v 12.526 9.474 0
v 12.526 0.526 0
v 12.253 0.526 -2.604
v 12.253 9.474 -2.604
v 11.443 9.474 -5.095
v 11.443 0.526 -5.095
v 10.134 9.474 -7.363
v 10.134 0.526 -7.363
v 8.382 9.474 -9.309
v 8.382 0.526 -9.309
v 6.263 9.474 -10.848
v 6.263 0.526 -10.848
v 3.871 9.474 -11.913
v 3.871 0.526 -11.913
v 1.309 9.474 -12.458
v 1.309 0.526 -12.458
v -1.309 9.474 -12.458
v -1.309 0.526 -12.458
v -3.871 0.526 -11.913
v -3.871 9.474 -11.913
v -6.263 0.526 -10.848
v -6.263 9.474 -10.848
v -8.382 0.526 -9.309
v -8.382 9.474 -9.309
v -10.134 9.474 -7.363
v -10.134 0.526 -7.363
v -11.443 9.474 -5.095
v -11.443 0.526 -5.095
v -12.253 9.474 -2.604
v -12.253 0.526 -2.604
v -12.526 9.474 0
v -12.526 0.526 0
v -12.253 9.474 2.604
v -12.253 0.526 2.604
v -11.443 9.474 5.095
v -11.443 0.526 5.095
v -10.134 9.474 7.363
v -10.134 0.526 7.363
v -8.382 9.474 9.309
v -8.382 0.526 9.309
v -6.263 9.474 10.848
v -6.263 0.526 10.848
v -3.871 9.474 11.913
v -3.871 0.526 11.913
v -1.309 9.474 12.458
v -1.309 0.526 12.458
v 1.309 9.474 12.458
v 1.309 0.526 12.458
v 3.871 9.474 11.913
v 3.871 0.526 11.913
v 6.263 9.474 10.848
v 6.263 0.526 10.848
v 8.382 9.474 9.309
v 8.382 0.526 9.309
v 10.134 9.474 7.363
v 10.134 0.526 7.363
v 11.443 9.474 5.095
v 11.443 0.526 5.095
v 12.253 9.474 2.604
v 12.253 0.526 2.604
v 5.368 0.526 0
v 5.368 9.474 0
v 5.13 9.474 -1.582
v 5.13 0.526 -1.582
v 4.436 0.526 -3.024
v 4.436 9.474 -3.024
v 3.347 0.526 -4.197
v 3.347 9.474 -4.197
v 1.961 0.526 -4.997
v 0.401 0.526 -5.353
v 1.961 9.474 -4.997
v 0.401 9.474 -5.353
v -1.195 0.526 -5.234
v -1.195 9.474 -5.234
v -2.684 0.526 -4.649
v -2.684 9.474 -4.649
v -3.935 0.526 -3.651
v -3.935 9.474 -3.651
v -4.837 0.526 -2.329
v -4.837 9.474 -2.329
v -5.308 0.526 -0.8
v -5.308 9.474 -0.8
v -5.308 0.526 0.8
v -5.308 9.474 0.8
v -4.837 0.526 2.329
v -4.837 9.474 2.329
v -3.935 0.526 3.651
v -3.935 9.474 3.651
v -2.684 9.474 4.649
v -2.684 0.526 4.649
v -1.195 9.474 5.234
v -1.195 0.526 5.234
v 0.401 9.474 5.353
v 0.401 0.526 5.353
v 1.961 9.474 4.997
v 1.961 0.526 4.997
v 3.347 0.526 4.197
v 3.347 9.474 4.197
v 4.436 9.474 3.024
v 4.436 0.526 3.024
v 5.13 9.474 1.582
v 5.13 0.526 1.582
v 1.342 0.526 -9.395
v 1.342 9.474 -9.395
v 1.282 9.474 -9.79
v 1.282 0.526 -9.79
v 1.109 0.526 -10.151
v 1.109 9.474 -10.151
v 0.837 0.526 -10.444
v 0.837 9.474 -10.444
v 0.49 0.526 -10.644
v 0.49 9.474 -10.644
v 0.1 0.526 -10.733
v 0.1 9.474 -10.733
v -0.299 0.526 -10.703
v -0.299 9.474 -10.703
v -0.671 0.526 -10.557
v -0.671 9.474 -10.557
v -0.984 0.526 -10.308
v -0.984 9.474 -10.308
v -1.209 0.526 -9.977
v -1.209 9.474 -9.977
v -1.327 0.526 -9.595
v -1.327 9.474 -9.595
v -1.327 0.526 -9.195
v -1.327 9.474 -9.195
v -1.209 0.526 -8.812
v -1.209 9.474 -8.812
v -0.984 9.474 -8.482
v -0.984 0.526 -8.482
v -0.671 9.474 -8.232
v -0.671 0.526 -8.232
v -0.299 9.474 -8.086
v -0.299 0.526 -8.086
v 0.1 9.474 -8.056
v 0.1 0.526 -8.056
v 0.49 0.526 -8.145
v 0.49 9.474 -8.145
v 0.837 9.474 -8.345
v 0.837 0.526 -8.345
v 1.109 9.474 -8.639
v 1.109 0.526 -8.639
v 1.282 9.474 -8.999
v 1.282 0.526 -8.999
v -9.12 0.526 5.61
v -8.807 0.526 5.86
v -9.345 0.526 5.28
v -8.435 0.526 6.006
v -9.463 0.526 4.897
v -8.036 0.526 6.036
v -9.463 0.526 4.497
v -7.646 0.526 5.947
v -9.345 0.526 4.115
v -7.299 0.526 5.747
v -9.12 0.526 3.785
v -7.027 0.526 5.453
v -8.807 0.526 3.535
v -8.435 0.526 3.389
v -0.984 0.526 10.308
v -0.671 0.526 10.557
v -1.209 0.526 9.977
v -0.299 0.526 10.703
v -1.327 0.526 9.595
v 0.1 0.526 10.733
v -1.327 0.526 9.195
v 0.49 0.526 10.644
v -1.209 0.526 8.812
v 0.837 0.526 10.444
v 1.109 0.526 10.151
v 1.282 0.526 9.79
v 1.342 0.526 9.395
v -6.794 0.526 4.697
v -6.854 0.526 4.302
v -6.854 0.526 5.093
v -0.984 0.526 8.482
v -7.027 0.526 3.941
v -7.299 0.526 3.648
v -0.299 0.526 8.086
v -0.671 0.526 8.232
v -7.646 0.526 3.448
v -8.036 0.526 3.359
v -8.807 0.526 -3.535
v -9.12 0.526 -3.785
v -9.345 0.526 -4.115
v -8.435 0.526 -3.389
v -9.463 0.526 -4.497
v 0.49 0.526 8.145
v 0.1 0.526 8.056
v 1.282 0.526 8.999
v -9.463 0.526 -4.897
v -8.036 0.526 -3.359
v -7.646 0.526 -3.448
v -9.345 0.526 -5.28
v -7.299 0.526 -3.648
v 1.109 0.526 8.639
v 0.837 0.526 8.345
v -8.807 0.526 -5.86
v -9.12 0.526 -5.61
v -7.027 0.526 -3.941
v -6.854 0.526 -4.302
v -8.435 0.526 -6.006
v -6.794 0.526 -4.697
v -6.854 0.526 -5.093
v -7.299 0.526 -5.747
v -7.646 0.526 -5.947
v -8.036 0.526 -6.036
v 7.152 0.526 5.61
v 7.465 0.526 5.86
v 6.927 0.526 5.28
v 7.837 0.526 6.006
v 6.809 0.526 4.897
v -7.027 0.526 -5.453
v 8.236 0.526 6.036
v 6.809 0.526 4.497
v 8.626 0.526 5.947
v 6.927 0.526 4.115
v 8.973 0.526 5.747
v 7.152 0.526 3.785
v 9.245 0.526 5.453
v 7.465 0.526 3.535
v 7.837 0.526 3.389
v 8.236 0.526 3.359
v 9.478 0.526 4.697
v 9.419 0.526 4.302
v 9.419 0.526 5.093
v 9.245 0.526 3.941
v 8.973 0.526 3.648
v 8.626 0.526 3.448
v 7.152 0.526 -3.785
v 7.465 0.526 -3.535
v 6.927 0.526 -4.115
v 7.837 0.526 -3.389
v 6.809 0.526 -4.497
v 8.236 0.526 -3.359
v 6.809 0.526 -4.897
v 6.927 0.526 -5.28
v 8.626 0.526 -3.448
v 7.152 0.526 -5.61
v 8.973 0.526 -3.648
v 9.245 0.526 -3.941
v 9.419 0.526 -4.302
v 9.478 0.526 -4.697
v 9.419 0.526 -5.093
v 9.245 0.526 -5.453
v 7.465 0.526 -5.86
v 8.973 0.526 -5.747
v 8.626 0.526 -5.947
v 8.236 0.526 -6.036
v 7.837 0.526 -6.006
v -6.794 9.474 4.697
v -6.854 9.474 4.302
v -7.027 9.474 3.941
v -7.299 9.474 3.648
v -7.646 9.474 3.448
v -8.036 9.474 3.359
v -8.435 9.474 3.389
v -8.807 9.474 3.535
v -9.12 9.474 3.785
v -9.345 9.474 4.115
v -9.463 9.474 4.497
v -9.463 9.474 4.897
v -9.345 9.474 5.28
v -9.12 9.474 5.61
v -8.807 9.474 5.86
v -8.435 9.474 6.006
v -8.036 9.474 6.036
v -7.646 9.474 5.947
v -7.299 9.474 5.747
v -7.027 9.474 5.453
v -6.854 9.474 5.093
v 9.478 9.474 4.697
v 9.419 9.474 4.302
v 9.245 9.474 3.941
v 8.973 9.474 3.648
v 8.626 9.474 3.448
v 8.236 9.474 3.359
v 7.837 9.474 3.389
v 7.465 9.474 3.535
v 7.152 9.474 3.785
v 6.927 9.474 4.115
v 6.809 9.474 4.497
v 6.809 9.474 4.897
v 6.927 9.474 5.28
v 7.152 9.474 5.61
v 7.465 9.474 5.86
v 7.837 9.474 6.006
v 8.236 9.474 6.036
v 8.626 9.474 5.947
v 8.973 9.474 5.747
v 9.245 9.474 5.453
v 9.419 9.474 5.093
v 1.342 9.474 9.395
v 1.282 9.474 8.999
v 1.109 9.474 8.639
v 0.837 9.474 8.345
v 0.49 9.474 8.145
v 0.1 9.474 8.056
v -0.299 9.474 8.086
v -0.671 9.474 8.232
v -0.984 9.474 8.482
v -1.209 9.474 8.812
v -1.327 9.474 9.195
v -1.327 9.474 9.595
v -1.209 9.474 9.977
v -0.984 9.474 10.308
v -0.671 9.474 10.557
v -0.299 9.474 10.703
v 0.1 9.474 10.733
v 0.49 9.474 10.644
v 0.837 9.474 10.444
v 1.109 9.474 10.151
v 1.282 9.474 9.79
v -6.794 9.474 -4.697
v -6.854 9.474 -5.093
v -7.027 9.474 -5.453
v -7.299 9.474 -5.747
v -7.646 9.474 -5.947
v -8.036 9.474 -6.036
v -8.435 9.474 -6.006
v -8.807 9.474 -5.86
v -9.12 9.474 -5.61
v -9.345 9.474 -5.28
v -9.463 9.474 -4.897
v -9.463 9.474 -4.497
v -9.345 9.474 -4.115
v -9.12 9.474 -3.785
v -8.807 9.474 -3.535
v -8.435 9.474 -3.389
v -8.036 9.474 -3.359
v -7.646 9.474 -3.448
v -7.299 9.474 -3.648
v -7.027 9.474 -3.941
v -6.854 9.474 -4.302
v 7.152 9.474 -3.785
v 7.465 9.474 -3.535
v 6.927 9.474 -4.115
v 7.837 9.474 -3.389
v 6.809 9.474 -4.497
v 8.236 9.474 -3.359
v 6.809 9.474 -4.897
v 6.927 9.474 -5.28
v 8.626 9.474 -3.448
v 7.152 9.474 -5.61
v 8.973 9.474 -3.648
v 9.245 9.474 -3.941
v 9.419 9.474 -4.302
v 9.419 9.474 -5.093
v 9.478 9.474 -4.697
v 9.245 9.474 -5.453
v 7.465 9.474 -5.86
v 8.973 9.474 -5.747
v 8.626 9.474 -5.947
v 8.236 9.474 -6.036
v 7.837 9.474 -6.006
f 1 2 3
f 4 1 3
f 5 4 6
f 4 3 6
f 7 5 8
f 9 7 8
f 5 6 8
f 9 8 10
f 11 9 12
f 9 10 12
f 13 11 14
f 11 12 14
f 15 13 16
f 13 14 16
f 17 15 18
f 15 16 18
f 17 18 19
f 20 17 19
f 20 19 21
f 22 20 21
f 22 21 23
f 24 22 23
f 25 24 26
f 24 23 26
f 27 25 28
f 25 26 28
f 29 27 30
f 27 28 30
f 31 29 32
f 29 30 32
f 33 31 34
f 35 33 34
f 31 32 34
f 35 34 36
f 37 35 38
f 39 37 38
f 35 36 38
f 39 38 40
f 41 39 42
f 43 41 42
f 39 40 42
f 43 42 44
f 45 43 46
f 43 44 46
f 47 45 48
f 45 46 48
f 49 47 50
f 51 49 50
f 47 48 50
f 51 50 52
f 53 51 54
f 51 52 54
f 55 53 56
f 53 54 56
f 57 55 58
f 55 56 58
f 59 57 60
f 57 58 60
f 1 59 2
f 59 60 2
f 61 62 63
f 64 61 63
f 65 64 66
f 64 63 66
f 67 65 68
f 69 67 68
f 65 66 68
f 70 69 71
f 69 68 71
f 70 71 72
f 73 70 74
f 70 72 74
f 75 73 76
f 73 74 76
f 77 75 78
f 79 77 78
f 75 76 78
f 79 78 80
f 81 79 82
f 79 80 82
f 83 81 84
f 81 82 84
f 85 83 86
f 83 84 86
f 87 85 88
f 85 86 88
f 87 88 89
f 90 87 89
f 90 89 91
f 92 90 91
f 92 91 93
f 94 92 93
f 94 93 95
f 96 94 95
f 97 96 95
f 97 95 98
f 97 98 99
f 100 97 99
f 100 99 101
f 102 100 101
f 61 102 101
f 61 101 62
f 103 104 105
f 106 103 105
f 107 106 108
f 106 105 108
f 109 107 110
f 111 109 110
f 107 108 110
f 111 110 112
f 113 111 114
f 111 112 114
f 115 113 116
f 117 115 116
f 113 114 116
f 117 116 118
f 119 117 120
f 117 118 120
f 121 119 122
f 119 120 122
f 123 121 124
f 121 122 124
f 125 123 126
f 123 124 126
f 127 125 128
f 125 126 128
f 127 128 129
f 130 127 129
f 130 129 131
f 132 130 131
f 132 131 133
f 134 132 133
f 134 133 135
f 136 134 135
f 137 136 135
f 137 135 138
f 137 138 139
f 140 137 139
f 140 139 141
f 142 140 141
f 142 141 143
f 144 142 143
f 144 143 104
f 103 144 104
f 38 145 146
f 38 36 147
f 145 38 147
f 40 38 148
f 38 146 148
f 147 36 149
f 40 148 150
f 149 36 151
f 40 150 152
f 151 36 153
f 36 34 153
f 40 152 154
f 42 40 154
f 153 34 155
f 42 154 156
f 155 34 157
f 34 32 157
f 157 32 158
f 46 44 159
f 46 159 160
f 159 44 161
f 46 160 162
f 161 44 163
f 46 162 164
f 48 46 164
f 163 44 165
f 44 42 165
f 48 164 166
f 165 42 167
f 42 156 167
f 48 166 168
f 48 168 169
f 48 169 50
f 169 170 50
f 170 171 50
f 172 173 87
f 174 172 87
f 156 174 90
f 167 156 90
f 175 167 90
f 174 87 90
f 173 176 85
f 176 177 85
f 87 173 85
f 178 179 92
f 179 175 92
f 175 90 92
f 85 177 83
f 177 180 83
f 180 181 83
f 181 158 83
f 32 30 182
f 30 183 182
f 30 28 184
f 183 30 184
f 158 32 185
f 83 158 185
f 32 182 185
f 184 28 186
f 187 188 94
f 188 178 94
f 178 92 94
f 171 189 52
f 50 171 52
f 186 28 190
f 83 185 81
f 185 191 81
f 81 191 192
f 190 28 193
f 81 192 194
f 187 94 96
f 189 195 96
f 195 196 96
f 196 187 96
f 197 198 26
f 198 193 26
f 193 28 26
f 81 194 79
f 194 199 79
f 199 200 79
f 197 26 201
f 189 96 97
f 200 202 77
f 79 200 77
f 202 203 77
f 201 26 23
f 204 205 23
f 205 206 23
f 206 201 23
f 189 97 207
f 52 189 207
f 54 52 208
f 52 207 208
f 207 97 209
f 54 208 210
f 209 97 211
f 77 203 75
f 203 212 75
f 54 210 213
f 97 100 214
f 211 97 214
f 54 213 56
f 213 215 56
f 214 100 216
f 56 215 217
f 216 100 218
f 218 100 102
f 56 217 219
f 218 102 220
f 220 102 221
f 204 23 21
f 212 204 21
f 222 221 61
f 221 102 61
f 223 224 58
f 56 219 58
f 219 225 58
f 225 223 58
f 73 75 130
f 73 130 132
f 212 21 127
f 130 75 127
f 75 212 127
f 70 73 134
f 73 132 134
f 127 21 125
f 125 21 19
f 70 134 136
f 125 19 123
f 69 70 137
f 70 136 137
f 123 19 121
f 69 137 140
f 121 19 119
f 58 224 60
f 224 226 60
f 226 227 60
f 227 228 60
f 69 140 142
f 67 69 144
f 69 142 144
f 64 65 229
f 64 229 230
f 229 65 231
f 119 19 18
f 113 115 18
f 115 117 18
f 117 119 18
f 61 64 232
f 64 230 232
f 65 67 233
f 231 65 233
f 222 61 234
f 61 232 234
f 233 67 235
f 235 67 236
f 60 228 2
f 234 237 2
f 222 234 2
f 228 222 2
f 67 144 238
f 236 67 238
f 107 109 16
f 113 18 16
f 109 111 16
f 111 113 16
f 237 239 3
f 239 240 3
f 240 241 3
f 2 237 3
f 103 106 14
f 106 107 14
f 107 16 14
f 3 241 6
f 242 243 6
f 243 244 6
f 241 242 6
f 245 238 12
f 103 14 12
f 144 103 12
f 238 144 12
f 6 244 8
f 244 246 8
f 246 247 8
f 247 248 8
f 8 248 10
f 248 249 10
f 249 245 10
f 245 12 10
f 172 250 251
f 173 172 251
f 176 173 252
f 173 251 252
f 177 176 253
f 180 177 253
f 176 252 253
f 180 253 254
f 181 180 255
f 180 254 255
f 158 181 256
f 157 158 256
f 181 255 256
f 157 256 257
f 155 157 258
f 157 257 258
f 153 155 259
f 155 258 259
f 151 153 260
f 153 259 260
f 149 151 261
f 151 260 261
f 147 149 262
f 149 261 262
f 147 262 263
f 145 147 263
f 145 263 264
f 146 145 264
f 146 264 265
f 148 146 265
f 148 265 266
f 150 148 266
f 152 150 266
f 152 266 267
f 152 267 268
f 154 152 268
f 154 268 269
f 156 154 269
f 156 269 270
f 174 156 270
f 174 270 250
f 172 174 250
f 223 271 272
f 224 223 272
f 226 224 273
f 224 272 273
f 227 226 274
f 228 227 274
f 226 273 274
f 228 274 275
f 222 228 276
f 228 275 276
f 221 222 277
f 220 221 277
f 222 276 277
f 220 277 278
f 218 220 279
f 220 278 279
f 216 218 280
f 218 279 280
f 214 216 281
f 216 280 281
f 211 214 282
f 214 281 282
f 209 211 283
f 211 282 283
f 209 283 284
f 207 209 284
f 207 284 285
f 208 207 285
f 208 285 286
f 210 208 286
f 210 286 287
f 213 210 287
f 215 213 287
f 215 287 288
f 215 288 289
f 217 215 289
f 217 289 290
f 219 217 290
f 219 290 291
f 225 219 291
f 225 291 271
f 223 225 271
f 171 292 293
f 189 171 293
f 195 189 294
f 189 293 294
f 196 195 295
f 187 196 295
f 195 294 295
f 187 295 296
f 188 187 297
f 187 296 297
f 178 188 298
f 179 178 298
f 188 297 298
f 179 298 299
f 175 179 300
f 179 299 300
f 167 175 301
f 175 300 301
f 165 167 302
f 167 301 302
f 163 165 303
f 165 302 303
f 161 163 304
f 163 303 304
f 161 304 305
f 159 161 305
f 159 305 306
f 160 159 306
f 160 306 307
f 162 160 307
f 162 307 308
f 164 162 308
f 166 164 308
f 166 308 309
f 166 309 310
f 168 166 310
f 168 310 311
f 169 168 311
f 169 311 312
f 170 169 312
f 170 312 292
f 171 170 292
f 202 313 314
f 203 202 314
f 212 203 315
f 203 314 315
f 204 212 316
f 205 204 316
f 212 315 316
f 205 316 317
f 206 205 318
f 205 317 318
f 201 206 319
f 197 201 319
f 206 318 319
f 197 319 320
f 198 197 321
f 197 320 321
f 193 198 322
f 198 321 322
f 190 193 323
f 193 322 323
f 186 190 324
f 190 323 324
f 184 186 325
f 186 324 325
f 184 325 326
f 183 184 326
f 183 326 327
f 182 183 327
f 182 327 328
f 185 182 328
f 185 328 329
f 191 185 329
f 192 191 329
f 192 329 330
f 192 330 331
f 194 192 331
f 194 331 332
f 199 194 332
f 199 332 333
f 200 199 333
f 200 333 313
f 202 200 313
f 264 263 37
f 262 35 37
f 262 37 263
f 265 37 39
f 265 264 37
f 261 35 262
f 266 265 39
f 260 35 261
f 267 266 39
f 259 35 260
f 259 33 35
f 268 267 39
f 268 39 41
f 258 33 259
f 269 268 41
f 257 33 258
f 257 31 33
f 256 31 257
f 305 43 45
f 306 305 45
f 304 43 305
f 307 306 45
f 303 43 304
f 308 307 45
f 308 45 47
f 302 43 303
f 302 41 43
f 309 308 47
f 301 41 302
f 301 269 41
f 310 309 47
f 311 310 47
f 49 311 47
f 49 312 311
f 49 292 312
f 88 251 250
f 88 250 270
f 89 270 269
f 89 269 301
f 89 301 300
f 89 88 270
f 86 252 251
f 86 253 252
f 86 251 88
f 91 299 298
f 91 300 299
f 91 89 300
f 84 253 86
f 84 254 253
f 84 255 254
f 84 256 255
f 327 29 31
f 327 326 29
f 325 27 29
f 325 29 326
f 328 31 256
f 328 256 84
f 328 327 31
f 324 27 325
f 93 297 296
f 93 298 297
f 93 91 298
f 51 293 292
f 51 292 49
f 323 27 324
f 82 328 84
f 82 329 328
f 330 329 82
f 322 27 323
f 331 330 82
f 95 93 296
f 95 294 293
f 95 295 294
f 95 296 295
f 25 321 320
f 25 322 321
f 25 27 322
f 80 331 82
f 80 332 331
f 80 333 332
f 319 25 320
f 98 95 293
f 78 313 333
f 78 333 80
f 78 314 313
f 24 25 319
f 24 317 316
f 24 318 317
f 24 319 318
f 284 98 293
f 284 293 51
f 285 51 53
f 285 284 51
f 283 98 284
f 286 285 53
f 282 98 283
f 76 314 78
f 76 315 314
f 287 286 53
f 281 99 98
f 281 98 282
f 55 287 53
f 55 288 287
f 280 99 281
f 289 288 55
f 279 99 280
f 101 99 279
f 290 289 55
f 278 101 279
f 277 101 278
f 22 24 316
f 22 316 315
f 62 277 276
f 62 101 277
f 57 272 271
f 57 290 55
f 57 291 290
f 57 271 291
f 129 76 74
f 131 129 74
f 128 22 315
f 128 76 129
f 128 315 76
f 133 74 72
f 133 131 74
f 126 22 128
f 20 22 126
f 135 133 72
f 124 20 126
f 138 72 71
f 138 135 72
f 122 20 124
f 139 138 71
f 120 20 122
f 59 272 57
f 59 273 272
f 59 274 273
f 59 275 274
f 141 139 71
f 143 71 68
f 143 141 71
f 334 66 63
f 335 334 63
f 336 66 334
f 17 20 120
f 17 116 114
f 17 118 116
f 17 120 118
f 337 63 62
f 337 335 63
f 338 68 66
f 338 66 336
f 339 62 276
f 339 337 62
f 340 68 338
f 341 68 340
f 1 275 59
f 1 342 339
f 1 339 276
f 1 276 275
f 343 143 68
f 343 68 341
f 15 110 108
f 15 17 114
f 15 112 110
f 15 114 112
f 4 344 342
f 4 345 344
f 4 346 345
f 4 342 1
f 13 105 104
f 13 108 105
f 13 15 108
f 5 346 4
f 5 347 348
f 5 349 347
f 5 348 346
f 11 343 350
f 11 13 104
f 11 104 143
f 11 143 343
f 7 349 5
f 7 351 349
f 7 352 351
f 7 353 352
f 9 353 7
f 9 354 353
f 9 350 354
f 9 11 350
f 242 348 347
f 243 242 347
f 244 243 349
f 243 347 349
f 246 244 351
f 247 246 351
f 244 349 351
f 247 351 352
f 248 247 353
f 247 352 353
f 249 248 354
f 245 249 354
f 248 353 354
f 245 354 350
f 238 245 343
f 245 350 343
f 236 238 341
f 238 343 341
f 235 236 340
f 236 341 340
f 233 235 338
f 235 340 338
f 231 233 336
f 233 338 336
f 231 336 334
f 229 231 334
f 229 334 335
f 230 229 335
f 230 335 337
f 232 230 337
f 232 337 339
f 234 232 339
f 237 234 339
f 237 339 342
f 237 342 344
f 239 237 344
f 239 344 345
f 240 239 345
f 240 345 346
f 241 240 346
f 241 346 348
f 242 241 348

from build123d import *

# Parameters (mm, degrees)
SKETCH1_R           = 14
BOSS_EXTRUDE1_DEPTH = 10
SKETCH2_R           = 1.5
SKETCH2_R_2         = 6
CUT_EXTRUDE1_DEPTH  = 11
SCALE_1_SCALE       = 0.894736842


with BuildPart() as part:
    # Sketch1 → Boss-Extrude1 (new body)
    with BuildSketch(Plane(origin=(0, 0, 0), x_dir=(1, 0, 0), z_dir=(0, 1, 0))):
        Circle(SKETCH1_R)
    extrude(amount=BOSS_EXTRUDE1_DEPTH)

    # Sketch2 → Cut-Extrude1 (cut, through all)
    with BuildSketch(Plane(origin=(0, 10, 0), x_dir=(1, 0, 0), z_dir=(0, 1, 0))):
        with Locations((0, 10.5)):
            Circle(SKETCH2_R)
        Circle(SKETCH2_R_2)
        with Locations((9.09326674, 5.25)):
            Circle(SKETCH2_R)
        with Locations((9.09326674, -5.25)):
            Circle(SKETCH2_R)
        with Locations((0, -10.5)):
            Circle(SKETCH2_R)
        with Locations((-9.09326674, -5.25)):
            Circle(SKETCH2_R)
        with Locations((-9.09326674, 5.25)):
            Circle(SKETCH2_R)
    extrude(amount=-CUT_EXTRUDE1_DEPTH, mode=Mode.SUBTRACT)


with BuildPart() as part_1:
    # ｽｹｰﾙ1: scaled about (0, 5, 0)
    add(part.part.scale(SCALE_1_SCALE).moved(Location((0, 0.526315789, 0))))


solid = part_1.part
